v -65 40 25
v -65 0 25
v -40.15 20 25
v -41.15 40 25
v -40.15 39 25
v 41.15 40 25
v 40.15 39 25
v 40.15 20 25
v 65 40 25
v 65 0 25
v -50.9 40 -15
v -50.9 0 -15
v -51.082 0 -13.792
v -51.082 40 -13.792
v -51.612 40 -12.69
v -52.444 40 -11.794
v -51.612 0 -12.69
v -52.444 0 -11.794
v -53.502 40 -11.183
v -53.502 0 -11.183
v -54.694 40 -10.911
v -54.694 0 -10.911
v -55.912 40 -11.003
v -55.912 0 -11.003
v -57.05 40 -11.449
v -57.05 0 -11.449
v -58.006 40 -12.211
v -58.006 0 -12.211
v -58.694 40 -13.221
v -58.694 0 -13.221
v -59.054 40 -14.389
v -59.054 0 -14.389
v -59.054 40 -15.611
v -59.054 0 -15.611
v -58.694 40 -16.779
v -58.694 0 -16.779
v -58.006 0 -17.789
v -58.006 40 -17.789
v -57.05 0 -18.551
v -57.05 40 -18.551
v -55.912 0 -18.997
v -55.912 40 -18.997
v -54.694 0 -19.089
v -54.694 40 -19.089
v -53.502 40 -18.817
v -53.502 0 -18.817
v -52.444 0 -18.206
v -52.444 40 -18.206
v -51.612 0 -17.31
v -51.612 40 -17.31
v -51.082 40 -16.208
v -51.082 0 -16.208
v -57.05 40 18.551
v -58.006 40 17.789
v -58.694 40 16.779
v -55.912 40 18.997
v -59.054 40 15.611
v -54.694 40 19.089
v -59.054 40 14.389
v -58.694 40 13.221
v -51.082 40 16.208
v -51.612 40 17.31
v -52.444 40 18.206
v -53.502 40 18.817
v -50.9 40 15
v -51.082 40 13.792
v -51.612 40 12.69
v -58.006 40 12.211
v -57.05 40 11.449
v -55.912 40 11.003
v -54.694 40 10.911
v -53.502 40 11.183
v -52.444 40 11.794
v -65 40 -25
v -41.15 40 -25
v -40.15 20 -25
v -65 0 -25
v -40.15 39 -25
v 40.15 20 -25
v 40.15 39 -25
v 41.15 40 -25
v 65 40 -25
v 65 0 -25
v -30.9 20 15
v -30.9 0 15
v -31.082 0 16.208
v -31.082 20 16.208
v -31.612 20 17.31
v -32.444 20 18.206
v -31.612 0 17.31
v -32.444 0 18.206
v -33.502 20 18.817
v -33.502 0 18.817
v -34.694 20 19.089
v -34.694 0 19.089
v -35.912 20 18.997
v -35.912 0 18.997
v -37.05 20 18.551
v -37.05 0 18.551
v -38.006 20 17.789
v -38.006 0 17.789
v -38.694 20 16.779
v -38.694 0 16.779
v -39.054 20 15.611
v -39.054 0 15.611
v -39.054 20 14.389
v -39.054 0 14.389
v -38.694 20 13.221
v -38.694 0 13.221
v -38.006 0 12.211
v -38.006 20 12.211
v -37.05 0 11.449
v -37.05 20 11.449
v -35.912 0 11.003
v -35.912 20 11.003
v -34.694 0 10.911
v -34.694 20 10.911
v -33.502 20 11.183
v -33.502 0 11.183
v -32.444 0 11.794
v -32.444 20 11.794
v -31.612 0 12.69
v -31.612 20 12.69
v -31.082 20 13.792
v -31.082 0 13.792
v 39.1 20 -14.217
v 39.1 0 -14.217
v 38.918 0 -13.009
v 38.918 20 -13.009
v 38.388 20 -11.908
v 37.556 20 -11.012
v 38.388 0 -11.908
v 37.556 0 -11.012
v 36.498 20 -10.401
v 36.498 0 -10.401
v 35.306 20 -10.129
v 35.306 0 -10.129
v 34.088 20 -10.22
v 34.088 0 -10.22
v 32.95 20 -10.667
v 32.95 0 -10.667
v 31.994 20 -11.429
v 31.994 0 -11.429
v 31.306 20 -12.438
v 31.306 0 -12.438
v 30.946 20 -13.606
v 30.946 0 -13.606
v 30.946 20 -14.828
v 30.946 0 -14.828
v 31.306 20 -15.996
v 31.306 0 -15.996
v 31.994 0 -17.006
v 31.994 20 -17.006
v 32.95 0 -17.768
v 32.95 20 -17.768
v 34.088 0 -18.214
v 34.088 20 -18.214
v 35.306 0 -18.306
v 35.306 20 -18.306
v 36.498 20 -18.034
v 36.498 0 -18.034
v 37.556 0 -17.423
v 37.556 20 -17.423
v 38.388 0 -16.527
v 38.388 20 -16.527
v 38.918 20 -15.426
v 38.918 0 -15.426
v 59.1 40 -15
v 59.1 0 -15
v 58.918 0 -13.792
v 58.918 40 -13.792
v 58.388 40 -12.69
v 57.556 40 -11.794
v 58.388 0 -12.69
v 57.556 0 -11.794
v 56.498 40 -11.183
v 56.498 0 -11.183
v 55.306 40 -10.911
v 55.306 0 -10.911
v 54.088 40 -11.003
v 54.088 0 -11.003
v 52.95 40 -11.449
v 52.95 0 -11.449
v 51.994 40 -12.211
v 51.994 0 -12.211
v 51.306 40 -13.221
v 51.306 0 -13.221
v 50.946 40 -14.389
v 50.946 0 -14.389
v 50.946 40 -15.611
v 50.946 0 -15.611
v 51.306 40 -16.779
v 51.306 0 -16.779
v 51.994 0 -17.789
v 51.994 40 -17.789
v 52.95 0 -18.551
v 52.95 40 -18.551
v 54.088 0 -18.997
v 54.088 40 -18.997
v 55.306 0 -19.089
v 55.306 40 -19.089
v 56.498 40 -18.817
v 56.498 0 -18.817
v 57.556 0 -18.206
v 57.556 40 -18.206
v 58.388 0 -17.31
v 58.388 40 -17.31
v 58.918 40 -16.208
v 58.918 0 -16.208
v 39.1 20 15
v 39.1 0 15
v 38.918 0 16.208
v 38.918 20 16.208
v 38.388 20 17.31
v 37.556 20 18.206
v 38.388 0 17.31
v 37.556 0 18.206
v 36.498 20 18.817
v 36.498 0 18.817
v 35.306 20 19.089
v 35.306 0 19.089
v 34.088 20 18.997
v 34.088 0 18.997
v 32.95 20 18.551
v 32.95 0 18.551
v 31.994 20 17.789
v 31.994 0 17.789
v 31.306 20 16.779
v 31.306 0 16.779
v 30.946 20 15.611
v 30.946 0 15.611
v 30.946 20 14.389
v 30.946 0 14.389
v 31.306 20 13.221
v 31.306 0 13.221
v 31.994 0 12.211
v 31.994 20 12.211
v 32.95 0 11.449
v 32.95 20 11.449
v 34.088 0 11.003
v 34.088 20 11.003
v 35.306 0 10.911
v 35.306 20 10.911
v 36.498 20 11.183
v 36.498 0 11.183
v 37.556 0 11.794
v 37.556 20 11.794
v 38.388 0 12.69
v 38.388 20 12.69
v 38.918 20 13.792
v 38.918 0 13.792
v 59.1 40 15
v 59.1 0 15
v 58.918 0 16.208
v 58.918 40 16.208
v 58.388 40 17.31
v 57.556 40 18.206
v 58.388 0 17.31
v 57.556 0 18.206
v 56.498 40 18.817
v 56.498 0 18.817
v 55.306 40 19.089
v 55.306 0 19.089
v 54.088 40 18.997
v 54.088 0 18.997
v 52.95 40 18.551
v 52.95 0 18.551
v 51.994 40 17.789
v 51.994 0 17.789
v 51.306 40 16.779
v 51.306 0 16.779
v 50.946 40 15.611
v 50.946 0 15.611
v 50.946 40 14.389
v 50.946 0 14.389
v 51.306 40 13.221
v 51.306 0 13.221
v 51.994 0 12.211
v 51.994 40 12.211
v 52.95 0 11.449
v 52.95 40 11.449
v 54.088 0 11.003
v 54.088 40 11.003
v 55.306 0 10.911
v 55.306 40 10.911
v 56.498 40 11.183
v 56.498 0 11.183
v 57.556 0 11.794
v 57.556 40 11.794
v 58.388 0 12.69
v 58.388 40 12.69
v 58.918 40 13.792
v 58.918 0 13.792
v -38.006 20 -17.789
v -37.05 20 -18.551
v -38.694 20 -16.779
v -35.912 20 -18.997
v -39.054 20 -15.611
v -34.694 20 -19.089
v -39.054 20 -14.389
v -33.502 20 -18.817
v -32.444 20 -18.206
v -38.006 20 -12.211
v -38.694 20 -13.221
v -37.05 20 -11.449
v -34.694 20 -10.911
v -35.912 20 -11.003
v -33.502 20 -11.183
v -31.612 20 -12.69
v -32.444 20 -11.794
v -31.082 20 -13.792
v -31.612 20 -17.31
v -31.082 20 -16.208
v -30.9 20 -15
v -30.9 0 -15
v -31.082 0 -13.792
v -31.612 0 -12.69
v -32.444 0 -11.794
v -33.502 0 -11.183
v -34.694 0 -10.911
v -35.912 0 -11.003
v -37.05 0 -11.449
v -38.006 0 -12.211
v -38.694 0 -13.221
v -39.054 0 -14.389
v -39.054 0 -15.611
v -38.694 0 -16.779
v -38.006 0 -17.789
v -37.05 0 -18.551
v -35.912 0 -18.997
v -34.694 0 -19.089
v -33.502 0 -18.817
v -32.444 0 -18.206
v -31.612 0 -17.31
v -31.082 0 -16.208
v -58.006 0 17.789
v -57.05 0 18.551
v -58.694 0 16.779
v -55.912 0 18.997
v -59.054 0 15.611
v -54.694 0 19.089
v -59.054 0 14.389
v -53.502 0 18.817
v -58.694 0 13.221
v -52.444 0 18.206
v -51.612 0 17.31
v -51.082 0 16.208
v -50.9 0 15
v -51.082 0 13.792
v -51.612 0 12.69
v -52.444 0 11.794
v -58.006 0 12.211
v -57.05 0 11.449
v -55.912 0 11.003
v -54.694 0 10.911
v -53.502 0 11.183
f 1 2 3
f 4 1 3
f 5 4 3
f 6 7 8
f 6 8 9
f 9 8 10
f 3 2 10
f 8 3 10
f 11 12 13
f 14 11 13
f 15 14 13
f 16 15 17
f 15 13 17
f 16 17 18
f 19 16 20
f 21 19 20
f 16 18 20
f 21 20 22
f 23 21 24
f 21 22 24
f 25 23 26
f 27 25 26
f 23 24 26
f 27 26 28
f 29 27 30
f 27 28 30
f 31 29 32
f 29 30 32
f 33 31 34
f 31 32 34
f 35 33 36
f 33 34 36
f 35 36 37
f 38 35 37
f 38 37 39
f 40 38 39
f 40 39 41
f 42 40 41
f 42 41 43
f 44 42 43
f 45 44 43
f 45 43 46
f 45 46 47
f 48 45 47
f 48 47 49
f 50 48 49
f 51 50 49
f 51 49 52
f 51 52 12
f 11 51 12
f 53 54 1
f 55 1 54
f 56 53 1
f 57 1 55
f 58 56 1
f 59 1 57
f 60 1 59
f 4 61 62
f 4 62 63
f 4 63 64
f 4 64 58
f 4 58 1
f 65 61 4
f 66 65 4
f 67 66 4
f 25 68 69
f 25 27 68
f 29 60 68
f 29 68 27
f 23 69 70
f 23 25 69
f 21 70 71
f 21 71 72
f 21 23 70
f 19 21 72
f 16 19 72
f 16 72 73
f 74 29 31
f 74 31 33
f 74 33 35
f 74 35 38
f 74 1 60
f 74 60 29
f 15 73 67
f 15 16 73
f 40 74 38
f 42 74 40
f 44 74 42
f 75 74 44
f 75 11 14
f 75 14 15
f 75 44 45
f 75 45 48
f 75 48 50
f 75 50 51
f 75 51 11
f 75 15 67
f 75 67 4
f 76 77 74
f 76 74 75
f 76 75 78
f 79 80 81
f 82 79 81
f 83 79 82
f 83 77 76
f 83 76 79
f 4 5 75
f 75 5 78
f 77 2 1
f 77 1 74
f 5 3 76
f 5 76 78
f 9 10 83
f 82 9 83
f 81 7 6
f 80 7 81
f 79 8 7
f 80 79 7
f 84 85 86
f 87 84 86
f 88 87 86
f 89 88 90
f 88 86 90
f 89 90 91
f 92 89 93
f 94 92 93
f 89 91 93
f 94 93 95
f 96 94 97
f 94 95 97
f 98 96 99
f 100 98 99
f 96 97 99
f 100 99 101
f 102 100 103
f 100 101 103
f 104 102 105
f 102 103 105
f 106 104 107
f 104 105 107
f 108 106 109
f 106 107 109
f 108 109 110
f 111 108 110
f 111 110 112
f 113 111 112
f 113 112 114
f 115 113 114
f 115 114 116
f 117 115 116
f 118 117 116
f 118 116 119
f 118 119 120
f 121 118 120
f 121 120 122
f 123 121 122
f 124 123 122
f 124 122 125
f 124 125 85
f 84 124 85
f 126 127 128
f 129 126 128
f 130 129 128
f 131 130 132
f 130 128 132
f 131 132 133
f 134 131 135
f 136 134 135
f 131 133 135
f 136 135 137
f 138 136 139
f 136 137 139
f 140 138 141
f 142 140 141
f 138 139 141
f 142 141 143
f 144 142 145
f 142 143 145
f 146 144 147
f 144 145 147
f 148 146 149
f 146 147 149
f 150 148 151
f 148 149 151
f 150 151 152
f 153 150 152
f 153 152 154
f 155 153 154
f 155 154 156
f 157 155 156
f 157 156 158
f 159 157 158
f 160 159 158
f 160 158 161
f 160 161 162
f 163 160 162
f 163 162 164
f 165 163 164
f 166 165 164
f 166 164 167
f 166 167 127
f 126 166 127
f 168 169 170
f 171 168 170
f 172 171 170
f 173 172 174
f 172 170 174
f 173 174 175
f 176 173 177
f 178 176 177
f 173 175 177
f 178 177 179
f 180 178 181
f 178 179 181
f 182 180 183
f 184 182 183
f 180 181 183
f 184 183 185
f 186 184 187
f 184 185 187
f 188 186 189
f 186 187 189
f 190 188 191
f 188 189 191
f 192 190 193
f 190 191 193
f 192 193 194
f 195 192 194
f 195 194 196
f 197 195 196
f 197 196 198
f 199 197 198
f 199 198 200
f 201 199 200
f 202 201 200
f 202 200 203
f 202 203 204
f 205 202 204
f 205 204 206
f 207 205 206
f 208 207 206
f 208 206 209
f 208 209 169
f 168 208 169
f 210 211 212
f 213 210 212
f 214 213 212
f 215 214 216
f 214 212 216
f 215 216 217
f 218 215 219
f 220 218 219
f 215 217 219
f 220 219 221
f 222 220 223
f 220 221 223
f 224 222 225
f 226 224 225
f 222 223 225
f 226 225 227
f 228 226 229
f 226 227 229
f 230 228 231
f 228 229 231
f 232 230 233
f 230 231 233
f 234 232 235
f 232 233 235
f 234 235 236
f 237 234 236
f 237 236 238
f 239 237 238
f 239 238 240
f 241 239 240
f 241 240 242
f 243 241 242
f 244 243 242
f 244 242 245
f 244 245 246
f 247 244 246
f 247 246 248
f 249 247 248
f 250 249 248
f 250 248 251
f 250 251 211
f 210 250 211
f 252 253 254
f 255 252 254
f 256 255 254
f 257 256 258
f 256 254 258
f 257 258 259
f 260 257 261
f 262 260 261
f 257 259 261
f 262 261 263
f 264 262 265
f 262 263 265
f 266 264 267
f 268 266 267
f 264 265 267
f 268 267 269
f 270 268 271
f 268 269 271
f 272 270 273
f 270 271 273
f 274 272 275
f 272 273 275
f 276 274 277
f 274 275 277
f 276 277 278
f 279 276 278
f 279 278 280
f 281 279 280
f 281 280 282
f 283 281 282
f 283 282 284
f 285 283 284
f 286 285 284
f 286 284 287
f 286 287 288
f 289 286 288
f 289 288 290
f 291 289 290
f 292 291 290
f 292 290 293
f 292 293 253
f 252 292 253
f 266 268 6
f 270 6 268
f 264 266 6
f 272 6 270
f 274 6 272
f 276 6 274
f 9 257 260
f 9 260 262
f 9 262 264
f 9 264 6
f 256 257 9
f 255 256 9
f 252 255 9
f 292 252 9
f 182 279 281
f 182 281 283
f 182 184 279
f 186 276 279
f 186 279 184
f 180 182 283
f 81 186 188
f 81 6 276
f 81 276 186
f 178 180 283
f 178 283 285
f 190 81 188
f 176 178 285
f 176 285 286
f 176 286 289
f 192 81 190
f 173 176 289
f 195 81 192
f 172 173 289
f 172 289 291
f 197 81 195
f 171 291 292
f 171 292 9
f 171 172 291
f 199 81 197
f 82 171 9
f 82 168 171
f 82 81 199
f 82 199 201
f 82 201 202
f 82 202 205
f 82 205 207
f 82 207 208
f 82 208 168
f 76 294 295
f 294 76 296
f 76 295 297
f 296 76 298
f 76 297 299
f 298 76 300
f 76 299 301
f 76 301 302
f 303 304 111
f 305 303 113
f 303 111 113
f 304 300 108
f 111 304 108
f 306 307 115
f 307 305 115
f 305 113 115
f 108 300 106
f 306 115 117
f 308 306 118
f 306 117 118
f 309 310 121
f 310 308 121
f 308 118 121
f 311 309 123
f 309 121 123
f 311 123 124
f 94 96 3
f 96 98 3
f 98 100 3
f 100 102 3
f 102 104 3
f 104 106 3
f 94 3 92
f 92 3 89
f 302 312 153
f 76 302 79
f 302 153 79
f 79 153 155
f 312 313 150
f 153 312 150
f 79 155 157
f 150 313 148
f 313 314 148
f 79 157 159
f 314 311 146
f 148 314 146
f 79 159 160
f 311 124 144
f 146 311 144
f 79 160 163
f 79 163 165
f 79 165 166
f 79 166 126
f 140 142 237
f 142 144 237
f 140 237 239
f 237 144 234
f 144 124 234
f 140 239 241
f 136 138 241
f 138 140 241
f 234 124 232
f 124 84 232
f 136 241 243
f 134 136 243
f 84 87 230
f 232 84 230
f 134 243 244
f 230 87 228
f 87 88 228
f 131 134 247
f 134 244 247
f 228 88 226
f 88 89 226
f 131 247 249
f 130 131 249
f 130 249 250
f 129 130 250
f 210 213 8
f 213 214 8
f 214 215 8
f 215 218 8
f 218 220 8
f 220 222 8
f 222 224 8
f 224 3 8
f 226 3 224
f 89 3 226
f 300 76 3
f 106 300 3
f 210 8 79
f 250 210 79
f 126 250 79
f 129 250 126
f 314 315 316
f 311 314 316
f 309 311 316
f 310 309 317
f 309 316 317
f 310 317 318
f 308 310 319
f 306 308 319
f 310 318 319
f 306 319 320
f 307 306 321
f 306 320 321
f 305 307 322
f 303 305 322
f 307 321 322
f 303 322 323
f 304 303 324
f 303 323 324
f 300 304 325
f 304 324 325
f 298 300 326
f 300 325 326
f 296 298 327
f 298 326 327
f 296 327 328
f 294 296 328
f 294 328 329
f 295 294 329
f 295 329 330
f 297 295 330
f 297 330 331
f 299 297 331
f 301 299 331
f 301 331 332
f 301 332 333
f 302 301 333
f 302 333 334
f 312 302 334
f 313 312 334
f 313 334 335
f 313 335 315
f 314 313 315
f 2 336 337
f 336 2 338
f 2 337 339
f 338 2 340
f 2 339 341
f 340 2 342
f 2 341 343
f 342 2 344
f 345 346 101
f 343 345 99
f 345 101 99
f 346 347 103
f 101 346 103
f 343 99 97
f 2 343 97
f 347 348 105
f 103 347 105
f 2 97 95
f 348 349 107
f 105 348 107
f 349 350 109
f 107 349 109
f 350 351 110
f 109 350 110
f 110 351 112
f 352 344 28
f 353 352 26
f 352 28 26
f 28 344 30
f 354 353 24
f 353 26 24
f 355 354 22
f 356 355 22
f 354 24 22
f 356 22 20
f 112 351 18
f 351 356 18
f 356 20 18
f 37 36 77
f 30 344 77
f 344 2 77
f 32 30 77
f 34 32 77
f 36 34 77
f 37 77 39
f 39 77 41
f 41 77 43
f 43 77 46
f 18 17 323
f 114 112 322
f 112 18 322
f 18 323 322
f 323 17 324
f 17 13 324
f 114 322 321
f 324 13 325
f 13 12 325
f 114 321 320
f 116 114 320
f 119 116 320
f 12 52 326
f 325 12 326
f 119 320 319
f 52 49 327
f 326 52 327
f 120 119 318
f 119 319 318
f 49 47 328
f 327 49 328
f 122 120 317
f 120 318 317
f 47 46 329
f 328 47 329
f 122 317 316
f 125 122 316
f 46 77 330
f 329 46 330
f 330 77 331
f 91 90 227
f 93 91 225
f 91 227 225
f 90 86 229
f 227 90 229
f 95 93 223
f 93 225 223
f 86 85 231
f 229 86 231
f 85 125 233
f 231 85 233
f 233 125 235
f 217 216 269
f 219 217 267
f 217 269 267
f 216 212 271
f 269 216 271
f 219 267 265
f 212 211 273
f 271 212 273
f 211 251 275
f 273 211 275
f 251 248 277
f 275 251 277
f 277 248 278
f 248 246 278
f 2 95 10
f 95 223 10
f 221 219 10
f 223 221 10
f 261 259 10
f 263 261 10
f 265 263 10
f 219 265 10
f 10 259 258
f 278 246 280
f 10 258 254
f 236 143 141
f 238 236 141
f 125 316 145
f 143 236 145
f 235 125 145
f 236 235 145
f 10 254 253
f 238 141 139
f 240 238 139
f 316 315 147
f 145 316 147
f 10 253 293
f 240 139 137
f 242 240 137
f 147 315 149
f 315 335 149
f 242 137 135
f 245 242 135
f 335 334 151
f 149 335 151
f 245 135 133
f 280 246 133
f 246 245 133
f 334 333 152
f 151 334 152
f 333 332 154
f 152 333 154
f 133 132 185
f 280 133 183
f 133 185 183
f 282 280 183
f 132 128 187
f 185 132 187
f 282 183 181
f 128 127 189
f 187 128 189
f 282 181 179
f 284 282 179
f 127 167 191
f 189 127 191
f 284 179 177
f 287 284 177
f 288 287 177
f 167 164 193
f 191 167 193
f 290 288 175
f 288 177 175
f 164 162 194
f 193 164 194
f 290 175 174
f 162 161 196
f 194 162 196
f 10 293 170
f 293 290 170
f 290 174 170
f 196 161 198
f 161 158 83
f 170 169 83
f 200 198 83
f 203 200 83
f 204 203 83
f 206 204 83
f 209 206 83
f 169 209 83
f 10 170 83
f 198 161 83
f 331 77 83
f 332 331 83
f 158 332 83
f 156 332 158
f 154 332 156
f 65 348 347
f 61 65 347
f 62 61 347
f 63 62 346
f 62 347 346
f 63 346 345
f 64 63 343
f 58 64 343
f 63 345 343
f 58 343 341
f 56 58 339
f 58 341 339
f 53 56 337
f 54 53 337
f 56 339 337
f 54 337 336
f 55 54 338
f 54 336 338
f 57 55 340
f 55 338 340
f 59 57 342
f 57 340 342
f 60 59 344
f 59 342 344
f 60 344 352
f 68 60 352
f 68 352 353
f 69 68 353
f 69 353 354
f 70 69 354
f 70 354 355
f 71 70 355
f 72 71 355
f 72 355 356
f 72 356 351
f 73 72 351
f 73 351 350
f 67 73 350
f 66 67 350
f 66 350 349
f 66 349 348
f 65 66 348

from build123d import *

# Parameters (mm, degrees)
SKETCH1_W           = 130
SKETCH1_H           = 50
BOSS_EXTRUDE1_DEPTH = 40
SKETCH2_W           = 80.3
SKETCH2_H           = 40
CUT_EXTRUDE1_DEPTH  = 51
SKETCH3_R           = 4.1
CUT_EXTRUDE2_DEPTH  = 41
CHAMFER1_SIZE       = 1
SKETCH5_R           = 4.1
CUT_EXTRUDE3_DEPTH  = 41


with BuildPart() as part:
    # Sketch1 → Boss-Extrude1 (new body)
    with BuildSketch(Plane(origin=(0, 0, 0), x_dir=(1, 0, 0), z_dir=(0, 1, 0))):
        Rectangle(SKETCH1_W, SKETCH1_H)
    extrude(amount=BOSS_EXTRUDE1_DEPTH)

    # Sketch2 → Cut-Extrude1 (cut, through all)
    with BuildSketch(Plane.XY.offset(25)):
        with Locations((0, 40)):
            Rectangle(SKETCH2_W, SKETCH2_H)
    extrude(amount=-CUT_EXTRUDE1_DEPTH, mode=Mode.SUBTRACT)

    # Sketch3 → Cut-Extrude2 (cut, through all)
    with BuildSketch(Plane.XZ):
        with Locations((-35, 15)):
            Circle(SKETCH3_R)
        with Locations((-35, -15)):
            Circle(SKETCH3_R)
        with Locations((35, -14.217273236)):
            Circle(SKETCH3_R)
        with Locations((35, 15)):
            Circle(SKETCH3_R)
    extrude(amount=-CUT_EXTRUDE2_DEPTH, mode=Mode.SUBTRACT)

    # Chamfer1
    chamfer1_edges = [part.edges().sort_by_distance(p)[0] for p in [
        (40.15, 40, 0),
        (-40.15, 40, 0),
    ]]
    chamfer(chamfer1_edges, length=CHAMFER1_SIZE)

    # Sketch5 → Cut-Extrude3 (cut, through all)
    with BuildSketch(Plane.XZ):
        with Locations((-55, 15)):
            Circle(SKETCH5_R)
        with Locations((-55, -15)):
            Circle(SKETCH5_R)
        with Locations((55, 15)):
            Circle(SKETCH5_R)
        with Locations((55, -15)):
            Circle(SKETCH5_R)
    extrude(amount=-CUT_EXTRUDE3_DEPTH, mode=Mode.SUBTRACT)


solid = part.part
